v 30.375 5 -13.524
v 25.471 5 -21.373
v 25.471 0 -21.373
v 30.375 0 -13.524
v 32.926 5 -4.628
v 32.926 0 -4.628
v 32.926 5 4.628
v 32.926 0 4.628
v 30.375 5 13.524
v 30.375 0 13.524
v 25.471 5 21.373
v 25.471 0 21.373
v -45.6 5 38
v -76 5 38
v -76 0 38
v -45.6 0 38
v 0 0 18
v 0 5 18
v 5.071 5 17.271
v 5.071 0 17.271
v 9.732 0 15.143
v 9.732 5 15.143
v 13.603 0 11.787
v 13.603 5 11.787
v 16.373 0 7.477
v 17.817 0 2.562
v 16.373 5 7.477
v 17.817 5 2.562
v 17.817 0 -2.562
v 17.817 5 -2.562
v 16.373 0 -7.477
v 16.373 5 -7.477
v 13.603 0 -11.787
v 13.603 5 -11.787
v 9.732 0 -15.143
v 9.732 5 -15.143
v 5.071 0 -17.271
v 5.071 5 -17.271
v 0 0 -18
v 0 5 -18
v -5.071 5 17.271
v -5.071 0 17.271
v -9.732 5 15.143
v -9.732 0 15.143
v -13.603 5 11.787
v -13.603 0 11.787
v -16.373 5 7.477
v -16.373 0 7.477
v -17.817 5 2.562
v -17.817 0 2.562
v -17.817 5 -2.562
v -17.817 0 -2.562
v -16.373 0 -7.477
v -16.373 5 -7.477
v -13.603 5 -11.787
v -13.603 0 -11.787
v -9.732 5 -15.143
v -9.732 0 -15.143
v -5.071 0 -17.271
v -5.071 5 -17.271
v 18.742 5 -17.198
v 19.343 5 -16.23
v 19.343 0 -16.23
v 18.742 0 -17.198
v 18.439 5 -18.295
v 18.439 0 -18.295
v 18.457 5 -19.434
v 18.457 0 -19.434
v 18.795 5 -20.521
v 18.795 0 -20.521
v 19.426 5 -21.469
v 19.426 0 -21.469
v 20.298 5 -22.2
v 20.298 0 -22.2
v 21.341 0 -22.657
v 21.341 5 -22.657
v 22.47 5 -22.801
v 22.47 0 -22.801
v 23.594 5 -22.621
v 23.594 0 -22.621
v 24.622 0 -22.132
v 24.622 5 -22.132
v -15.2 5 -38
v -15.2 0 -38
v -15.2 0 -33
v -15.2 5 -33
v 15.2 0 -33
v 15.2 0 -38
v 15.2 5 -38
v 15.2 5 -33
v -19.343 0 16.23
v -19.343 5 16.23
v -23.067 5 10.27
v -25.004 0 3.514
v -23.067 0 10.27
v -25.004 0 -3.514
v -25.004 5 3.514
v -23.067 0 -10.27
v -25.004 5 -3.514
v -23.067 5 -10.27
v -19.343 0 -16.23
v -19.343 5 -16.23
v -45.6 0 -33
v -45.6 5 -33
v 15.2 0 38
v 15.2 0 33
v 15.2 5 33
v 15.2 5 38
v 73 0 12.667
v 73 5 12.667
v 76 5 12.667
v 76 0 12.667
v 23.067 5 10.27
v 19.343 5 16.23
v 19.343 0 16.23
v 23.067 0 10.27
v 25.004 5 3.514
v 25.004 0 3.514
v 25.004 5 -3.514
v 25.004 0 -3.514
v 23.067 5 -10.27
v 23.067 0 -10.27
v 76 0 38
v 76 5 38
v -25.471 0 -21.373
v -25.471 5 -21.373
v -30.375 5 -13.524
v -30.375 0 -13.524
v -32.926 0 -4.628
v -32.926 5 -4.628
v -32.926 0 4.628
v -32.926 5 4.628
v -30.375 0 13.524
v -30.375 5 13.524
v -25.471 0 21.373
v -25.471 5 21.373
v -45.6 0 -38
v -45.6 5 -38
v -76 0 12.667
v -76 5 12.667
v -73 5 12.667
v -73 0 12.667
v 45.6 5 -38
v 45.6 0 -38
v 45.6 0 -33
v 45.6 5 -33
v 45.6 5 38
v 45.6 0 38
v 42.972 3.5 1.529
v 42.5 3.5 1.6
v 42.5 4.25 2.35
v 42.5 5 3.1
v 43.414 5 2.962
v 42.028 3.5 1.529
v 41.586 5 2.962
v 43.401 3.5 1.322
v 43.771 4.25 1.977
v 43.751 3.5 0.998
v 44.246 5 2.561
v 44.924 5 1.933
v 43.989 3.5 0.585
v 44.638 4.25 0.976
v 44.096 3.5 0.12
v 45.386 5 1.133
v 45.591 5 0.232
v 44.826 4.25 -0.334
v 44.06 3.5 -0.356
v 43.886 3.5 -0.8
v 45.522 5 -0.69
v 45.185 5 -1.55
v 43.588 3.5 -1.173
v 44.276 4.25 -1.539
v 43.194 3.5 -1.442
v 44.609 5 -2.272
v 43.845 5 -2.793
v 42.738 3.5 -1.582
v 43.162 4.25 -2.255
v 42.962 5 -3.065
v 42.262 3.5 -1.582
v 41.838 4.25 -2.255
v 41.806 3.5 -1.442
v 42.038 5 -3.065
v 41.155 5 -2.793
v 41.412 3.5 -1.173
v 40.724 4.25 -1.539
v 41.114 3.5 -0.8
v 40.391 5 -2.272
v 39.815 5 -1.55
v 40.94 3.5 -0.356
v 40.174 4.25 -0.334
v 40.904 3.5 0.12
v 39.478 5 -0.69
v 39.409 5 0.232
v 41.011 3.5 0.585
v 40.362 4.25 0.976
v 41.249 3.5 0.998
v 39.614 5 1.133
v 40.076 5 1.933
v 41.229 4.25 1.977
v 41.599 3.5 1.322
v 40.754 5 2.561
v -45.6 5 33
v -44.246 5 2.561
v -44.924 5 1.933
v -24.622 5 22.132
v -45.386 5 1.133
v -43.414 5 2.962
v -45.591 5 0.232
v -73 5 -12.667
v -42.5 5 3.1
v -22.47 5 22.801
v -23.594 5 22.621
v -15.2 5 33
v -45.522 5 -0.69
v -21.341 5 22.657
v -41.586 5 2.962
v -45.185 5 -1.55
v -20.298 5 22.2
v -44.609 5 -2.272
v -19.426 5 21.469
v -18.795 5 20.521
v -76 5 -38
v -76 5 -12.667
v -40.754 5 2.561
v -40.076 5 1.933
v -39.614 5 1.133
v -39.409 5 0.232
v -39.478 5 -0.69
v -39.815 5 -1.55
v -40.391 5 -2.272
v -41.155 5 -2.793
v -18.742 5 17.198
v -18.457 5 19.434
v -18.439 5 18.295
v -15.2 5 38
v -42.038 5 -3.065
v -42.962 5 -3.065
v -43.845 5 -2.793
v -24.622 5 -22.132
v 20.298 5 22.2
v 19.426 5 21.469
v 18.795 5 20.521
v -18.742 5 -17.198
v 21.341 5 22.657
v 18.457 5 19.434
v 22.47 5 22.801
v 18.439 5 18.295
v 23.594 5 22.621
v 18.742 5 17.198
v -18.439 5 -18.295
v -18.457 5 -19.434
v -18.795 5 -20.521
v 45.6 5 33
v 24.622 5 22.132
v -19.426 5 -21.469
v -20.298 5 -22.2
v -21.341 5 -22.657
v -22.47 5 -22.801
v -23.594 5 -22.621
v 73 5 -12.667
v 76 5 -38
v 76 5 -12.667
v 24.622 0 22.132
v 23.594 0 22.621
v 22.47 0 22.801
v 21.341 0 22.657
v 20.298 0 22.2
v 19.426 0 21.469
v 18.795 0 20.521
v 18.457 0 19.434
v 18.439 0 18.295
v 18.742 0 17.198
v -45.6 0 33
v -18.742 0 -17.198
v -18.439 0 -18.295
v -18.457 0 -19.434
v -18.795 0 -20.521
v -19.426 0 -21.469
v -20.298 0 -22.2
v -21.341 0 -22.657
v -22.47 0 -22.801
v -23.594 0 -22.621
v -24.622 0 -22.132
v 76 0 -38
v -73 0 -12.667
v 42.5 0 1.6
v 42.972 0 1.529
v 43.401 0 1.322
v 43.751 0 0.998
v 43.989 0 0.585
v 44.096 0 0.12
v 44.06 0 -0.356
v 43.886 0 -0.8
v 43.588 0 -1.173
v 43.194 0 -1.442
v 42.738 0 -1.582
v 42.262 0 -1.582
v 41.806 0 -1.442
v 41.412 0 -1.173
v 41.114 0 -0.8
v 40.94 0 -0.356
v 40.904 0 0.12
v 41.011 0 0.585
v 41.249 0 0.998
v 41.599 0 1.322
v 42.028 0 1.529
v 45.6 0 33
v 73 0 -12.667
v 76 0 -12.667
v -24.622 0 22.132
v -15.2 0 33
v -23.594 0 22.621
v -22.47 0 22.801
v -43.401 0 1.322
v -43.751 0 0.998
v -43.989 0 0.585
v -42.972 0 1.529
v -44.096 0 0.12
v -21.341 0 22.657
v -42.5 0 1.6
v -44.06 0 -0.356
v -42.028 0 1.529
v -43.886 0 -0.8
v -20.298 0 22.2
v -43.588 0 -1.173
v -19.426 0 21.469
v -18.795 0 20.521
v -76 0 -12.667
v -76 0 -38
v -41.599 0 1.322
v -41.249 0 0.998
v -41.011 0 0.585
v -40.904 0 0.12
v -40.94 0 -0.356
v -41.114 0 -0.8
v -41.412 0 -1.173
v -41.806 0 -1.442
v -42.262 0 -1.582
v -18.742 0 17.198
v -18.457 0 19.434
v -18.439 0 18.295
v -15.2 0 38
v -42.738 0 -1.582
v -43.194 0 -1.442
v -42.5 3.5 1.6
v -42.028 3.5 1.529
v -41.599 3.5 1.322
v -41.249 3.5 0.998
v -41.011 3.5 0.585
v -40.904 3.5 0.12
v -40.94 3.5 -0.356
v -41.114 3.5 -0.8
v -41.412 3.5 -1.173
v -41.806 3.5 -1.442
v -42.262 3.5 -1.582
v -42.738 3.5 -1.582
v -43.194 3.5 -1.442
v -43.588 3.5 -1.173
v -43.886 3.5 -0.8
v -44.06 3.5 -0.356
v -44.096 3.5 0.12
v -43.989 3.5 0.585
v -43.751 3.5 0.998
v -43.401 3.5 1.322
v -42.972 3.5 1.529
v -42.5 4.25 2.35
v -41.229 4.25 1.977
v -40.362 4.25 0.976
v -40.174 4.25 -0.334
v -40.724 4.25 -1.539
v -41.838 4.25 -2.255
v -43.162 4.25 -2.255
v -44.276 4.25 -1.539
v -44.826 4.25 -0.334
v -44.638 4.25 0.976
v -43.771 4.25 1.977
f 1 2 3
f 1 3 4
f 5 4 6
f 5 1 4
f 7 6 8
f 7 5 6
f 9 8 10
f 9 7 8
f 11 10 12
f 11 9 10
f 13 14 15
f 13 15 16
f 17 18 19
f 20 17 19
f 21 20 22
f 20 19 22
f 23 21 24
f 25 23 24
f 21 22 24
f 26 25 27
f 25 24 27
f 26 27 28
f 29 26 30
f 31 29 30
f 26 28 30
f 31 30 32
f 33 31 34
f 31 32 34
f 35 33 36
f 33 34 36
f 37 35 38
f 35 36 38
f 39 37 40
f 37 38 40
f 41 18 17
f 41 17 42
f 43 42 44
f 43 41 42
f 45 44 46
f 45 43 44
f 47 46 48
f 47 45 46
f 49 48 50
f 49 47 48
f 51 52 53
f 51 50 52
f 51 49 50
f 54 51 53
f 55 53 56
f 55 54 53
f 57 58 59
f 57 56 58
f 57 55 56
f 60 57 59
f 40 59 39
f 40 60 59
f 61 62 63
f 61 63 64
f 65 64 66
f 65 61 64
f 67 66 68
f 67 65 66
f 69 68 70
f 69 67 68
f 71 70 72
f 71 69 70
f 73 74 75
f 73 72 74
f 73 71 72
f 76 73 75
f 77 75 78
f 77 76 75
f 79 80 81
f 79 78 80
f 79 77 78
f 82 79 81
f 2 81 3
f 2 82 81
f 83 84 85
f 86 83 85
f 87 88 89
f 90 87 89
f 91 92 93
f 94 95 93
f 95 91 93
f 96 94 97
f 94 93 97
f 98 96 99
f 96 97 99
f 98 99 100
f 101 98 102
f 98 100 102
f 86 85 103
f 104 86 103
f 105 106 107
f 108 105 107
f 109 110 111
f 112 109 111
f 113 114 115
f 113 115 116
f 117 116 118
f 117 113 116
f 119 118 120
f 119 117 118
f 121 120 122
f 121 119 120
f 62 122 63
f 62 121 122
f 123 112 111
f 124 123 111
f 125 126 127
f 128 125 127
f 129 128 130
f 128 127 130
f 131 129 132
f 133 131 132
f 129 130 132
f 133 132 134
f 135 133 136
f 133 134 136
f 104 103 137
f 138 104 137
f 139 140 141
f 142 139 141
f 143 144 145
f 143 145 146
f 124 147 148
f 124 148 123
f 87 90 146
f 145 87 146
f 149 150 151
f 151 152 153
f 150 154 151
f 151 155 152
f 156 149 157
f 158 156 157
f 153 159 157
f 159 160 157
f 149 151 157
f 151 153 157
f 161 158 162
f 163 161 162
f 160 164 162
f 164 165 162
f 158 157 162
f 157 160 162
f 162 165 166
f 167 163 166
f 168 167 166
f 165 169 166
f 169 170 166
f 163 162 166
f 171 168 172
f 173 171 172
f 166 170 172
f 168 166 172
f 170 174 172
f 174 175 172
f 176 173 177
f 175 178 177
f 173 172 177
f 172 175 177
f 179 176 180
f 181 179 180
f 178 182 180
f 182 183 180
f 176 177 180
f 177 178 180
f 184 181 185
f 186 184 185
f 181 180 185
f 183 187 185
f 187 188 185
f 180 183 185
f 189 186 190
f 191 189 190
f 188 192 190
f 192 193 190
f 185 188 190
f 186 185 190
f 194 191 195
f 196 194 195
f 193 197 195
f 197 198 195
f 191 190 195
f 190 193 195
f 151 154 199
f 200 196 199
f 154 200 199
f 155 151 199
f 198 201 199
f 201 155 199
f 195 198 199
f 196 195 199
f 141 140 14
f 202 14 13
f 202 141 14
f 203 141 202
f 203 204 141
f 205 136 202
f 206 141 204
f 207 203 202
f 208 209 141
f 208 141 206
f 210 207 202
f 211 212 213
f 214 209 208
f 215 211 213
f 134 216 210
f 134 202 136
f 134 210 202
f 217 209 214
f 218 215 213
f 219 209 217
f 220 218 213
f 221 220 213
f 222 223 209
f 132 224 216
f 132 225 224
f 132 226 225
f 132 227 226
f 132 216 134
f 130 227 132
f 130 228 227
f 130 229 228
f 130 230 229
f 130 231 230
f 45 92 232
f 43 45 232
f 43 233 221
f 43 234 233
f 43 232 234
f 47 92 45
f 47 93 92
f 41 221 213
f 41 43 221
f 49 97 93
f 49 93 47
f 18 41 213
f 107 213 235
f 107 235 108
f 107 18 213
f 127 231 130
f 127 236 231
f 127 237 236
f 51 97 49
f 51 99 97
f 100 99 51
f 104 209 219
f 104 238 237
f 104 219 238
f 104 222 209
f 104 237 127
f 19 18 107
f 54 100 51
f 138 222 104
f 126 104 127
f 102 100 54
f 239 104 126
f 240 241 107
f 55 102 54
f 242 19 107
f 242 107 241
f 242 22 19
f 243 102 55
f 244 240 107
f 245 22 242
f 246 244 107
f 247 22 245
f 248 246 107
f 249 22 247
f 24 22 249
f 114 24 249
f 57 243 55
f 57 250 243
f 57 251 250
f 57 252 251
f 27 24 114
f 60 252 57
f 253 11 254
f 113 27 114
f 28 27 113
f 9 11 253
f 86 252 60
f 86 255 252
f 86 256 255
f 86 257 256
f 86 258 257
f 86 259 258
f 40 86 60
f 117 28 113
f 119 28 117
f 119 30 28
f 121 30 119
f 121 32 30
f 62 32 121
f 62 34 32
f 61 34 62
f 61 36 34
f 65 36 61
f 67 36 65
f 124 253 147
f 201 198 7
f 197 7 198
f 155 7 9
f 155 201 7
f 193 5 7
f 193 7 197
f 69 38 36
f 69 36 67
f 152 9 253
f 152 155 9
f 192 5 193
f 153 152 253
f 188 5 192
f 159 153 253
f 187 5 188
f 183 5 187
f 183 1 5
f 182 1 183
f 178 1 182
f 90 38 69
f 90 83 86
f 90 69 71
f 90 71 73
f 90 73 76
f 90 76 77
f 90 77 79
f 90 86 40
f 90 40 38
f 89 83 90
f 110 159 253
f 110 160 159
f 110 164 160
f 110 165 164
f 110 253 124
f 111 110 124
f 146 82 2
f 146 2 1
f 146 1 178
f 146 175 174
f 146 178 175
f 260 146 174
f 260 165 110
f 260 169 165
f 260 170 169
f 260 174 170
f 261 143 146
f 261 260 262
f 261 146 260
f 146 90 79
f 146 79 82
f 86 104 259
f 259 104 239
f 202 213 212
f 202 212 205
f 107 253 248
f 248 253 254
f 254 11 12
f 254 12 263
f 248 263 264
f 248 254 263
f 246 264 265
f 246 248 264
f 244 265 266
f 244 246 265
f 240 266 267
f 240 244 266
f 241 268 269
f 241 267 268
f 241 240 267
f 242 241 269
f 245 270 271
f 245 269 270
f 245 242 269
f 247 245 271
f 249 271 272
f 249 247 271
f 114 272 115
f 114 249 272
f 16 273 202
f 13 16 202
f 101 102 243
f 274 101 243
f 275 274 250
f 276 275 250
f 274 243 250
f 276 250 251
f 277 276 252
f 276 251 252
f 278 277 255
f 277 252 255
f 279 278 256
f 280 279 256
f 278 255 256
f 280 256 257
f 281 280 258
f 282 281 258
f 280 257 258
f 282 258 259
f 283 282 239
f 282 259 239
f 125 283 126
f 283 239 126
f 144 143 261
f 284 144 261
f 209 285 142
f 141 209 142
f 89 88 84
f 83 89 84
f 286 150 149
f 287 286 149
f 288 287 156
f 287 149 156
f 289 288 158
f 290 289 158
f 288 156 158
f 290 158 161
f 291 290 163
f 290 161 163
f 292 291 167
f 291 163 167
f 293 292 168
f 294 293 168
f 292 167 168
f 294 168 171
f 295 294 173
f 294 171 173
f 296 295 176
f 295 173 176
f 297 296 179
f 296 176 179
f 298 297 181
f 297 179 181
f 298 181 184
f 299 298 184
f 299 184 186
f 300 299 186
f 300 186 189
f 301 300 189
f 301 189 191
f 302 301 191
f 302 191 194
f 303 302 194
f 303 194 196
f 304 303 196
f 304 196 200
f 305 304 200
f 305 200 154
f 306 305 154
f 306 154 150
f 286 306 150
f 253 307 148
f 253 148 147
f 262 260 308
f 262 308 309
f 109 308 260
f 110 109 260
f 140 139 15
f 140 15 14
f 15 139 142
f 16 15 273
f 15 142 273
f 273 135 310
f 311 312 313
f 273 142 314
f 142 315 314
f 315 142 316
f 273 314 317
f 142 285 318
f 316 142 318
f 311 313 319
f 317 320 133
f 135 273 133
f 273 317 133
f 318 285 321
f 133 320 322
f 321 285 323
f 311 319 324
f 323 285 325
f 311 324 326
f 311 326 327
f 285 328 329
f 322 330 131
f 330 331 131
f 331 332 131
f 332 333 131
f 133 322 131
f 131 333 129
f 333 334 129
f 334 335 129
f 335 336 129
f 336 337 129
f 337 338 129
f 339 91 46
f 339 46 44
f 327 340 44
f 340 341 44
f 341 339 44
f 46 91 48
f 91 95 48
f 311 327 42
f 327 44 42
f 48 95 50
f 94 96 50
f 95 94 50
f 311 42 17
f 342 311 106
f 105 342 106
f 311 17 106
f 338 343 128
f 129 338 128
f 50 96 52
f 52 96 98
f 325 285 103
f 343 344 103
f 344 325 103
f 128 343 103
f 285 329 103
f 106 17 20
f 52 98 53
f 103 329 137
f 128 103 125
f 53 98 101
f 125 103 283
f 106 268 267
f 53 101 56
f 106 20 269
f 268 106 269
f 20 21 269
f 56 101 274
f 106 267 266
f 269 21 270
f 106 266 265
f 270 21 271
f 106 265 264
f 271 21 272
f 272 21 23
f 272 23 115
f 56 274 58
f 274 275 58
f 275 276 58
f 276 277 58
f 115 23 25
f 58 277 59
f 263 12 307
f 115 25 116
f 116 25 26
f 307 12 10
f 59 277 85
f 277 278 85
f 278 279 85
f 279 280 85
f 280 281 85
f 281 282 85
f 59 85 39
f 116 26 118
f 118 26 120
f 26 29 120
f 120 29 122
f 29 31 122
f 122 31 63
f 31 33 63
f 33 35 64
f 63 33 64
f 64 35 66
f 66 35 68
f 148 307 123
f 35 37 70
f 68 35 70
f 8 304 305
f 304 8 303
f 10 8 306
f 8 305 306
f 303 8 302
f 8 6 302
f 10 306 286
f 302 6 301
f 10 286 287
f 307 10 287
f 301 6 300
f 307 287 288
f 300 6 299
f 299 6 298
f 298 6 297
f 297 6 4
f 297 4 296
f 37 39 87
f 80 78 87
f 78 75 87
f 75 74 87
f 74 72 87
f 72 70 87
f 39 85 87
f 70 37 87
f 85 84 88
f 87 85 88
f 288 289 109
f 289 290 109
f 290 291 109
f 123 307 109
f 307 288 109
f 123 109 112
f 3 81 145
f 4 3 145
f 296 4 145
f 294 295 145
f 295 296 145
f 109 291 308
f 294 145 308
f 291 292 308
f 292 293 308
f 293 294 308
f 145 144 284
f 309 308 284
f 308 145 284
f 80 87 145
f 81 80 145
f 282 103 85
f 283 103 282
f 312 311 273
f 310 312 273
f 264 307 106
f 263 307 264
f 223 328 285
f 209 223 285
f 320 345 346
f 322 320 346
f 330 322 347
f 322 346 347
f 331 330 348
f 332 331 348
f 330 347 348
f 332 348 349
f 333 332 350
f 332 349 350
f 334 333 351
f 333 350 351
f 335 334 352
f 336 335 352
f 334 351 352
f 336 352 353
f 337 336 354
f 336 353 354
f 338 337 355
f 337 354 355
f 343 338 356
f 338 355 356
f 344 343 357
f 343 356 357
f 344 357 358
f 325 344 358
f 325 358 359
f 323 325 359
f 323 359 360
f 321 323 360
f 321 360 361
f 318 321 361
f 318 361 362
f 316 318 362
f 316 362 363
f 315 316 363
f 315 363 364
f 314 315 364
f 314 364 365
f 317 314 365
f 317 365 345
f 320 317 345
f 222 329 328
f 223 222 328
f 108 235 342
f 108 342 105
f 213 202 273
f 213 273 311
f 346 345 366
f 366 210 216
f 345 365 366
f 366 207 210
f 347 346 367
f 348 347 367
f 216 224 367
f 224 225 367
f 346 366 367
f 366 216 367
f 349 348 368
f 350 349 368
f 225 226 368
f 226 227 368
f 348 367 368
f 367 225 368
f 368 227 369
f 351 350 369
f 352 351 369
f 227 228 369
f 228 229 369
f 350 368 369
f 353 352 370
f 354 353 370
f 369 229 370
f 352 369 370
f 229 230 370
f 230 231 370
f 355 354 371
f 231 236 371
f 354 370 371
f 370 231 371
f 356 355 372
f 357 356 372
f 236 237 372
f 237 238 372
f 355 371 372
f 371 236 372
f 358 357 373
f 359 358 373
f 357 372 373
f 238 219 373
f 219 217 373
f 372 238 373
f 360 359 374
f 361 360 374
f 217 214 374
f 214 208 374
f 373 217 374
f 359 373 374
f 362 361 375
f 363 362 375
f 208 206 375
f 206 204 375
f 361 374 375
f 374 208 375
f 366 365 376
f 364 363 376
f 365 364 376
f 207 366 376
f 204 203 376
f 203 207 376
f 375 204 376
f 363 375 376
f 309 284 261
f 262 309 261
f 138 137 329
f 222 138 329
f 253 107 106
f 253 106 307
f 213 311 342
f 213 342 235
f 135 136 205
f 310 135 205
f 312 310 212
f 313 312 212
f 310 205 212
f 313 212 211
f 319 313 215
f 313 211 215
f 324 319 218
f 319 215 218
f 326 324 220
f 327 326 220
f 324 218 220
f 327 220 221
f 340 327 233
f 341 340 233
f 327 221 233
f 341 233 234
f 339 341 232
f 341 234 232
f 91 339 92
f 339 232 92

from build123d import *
from build123d.topology import SkipClean

# Parameters (mm, degrees)
BOSS_EXTRUDE1_DEPTH   = 5
MIRROR1_START         = -33
MIRROR1_OUTLINE_W     = 146
MIRROR1_OUTLINE_H     = 5
MIRROR1_DEPTH         = 66
MIRROR1_START_2       = -38
MIRROR1_2_OUTLINE_W   = 27.4
MIRROR1_2_OUTLINE_H   = 5
MIRROR1_2_OUTLINE_W_2 = 30.4
MIRROR1_2_DEPTH       = 76
MIRROR1_START_3       = 12.666666667
MIRROR1_3_OUTLINE_W   = 3
MIRROR1_3_OUTLINE_H   = 5
MIRROR1_3_DEPTH       = 25.333333333
MIRROR1_4_OUTLINE_W   = 3
MIRROR1_4_OUTLINE_H   = 5
MIRROR1_4_DEPTH       = 25.333333333
CUT_EXTRUDE1_DEPTH    = 86.117565755
SKETCH3_R             = 1.6
CUT_EXTRUDE2_DEPTH    = 86.117565755
CHAMFER1_SIZE         = 1.5


# Read off the part's stored shape, not the designer's step: Mirror1
with BuildPart() as part:
    # Sketch1 → Boss-Extrude1 (new body)
    with BuildSketch(Plane(origin=(0, 0, 0), x_dir=(1, 0, 0), z_dir=(0, 1, 0))):
        Polygon((-76, 38), (-76, 12.666666667), (-73, 12.666666667), (-73, 0), (0, 0), (0, 38), (-15.2, 38), (-15.2, 33), (-45.6, 33), (-45.6, 38), align=None)
    extrude(amount=BOSS_EXTRUDE1_DEPTH)

    # Mirror1 outline → Mirror1 (add)
    with BuildSketch(Plane.XY.offset(MIRROR1_START)):
        with Locations((0, 2.5)):
            Rectangle(MIRROR1_OUTLINE_W, MIRROR1_OUTLINE_H)
    extrude(amount=MIRROR1_DEPTH)

    # Mirror1 2 outline → Mirror1 2 (add)
    with BuildSketch(Plane.XY.offset(MIRROR1_START_2)):
        with Locations((-59.3, 2.5)):
            Rectangle(MIRROR1_2_OUTLINE_W, MIRROR1_2_OUTLINE_H)
        with Locations((0, 2.5)):
            Rectangle(MIRROR1_2_OUTLINE_W_2, MIRROR1_2_OUTLINE_H)
        with Locations((59.3, 2.5)):
            Rectangle(MIRROR1_2_OUTLINE_W, MIRROR1_2_OUTLINE_H)
    extrude(amount=MIRROR1_2_DEPTH)

    # Mirror1 3 outline → Mirror1 3 (add)
    with BuildSketch(Plane.XY.offset(MIRROR1_START_3)):
        with Locations((-74.5, 2.5)):
            Rectangle(MIRROR1_3_OUTLINE_W, MIRROR1_3_OUTLINE_H)
        with Locations((74.5, 2.5)):
            Rectangle(MIRROR1_3_OUTLINE_W, MIRROR1_3_OUTLINE_H)
    extrude(amount=MIRROR1_3_DEPTH)

    # Mirror1 4 outline → Mirror1 4 (add)
    with BuildSketch(Plane.XY.offset(MIRROR1_START_2)):
        with Locations((74.5, 2.5)):
            Rectangle(MIRROR1_4_OUTLINE_W, MIRROR1_4_OUTLINE_H)
    extrude(amount=MIRROR1_4_DEPTH)

    # Sketch2 → Cut-Extrude1 (cut, through all)
    with BuildSketch(Plane(origin=(0, 5, 0), x_dir=(1, 0, 0), z_dir=(0, 1, 0))):
        with BuildLine():
            Line((0, 18), (0, -18))
            ThreePointArc((0, -18), (-18, 0), (0, 18))
        make_face()
        with BuildLine():
            ThreePointArc((-19.342622189, 16.230387145), (-19.835649522, 21.865715356), (-25.470977734, 21.372688022))
            ThreePointArc((-25.470977734, 21.372688022), (-33.25, 0), (-25.470977734, -21.372688022))
            ThreePointArc((-25.470977734, -21.372688022), (-19.835649522, -21.865715356), (-19.342622189, -16.230387145))
            ThreePointArc((-19.342622189, -16.230387145), (-25.25, 0), (-19.342622189, 16.230387145))
        make_face()
    cut_extrude1 = extrude(amount=-CUT_EXTRUDE1_DEPTH, mode=Mode.SUBTRACT)

    # Sketch3 → Cut-Extrude2 (cut, through all)
    with BuildSketch(Plane(origin=(0, 5, 0), x_dir=(1, 0, 0), z_dir=(0, 1, 0))):
        with Locations(Location((-42.5, 0, 0), (0, 0, 270))):
            Circle(SKETCH3_R)
        with Locations(Location((42.5, 0, 0), (0, 0, 270))):
            Circle(SKETCH3_R)
    extrude(amount=-CUT_EXTRUDE2_DEPTH, mode=Mode.SUBTRACT)

    # Chamfer1
    chamfer1_edges = [part.edges().sort_by_distance(p)[0] for p in [
        (-42.5, 5, -1.6),
        (42.5, 5, -1.6),
    ]]
    chamfer(chamfer1_edges, length=CHAMFER1_SIZE)

    # Mirror3: Cut-Extrude1 across plane
    with SkipClean():  # the faces are left unmerged after this step: merging them gives an invalid solid
        add(cut_extrude1.mirror(Plane(origin=(0, 0, 0), x_dir=(0, 0, 1), z_dir=(1, 0, 0))), mode=Mode.SUBTRACT)


solid = part.part
